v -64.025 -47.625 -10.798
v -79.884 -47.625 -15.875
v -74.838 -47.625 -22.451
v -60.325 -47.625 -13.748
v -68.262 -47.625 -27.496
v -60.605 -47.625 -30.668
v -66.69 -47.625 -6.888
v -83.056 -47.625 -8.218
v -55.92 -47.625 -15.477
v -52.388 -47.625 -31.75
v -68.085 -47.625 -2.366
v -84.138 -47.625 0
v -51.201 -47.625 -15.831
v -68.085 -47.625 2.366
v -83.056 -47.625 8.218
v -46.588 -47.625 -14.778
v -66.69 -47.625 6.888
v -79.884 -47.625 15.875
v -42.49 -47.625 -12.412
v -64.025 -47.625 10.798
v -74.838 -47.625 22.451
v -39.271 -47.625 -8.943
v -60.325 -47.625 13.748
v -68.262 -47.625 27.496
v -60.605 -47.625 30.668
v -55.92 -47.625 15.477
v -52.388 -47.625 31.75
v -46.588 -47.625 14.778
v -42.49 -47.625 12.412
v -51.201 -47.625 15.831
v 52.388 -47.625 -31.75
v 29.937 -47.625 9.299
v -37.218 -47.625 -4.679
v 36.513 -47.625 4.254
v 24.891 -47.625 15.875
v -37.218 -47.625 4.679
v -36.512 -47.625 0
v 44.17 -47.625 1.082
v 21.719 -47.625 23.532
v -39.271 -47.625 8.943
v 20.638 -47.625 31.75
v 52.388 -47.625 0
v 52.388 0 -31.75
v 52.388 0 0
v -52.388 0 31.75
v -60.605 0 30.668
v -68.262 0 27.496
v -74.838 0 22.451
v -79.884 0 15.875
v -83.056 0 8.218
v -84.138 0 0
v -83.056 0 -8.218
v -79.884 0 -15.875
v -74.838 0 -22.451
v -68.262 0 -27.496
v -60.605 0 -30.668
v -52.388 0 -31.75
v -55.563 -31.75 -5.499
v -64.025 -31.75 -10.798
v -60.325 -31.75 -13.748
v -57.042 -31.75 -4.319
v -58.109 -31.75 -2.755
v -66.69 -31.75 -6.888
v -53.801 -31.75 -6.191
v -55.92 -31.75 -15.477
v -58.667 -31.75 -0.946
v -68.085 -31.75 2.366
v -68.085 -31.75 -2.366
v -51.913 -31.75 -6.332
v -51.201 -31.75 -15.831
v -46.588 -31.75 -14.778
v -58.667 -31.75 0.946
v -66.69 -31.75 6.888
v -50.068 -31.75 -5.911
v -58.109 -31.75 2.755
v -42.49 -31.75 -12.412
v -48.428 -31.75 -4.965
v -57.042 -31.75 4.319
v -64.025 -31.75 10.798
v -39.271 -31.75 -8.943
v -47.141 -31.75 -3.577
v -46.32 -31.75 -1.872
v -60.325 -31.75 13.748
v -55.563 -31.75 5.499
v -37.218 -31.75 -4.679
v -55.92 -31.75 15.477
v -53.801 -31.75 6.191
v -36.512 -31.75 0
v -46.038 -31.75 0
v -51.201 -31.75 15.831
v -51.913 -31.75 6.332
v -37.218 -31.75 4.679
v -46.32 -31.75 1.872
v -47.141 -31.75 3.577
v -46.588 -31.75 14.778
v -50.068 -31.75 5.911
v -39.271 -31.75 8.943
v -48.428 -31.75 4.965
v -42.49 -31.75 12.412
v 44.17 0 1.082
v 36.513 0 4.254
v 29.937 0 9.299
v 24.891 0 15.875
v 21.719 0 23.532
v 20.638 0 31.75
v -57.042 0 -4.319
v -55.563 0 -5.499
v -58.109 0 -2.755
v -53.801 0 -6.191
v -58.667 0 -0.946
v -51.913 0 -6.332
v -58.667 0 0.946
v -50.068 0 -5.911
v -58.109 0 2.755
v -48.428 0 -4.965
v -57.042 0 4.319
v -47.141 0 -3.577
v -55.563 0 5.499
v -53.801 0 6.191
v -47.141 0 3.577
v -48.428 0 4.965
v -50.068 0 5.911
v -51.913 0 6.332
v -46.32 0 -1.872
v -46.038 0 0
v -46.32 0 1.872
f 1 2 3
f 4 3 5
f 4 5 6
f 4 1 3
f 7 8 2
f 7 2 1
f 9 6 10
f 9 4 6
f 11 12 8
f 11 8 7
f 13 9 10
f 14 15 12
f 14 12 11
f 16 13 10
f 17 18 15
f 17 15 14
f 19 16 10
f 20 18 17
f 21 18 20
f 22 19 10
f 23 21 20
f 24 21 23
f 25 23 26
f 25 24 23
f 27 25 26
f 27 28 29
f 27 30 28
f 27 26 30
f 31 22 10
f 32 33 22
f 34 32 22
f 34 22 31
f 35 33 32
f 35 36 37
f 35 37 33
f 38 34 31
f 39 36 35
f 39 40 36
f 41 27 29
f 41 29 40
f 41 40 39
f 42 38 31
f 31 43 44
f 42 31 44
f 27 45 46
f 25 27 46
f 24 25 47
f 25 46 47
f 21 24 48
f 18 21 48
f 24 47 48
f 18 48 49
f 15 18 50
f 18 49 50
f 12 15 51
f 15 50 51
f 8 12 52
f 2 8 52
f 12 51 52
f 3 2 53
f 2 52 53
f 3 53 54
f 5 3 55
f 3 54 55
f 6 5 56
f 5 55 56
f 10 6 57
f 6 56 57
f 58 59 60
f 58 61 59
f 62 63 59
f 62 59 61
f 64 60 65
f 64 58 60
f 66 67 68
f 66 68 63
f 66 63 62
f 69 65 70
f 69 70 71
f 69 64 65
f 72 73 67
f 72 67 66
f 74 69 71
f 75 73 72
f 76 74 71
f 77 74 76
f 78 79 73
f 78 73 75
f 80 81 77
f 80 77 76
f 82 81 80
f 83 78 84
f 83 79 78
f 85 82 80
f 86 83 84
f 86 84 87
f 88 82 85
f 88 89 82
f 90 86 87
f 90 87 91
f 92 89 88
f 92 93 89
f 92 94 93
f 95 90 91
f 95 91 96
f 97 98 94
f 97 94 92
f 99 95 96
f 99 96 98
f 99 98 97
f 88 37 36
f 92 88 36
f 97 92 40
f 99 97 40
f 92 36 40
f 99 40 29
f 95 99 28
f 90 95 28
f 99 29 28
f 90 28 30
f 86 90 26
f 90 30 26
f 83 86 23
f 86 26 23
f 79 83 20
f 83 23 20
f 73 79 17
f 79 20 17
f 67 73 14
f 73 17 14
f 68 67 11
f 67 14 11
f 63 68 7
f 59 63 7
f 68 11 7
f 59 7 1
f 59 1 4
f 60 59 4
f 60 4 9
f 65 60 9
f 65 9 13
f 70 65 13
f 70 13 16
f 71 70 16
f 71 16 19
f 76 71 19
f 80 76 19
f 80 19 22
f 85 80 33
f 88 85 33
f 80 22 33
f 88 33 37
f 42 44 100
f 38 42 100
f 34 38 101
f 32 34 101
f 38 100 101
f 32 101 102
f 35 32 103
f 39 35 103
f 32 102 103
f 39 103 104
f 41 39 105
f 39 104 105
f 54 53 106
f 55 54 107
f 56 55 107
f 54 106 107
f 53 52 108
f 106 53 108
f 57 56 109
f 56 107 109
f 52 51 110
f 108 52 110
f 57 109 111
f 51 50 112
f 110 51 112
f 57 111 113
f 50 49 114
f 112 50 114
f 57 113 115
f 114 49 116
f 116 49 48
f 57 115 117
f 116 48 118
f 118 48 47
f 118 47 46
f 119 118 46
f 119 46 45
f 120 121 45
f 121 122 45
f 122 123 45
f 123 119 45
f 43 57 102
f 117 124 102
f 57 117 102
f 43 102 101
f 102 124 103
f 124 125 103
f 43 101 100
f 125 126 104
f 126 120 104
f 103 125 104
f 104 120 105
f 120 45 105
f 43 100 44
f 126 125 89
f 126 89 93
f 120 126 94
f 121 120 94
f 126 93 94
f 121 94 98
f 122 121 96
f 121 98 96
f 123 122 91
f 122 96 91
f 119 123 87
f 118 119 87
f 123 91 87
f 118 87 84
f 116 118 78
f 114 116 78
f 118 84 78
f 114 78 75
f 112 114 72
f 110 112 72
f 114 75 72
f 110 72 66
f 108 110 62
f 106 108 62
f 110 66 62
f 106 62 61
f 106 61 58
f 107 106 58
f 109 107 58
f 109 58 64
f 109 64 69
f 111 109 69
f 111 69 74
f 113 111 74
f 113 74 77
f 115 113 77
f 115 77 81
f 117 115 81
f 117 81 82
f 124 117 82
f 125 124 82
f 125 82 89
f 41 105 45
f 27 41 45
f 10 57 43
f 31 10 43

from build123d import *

# Parameters (mm, degrees)
F1_DEPTH = 47.625
F2_R     = 15.875
F3_DEPTH = 15.875
F4_R     = 6.35
F5_DEPTH = 34.29


with BuildPart() as f1:
    # F0 (on Front) → F1 (new body)
    with BuildSketch(Plane.XZ):
        with BuildLine():
            ThreePointArc((-52.3875, 31.75), (-84.1375, 0), (-52.3875, -31.75))
            Line((-52.3875, -31.75), (52.3875, -31.75))
            Line((52.3875, -31.75), (52.3875, 0))
            ThreePointArc((52.3875, 0), (29.93686, 9.29936), (20.6375, 31.75))
            Line((20.6375, 31.75), (-52.3875, 31.75))
        make_face()
    extrude(amount=F1_DEPTH)

    # F2 (on face) → F3 (cut)
    with BuildSketch(Plane.XZ.offset(47.625)):
        with Locations((-52.3875, 0)):
            Circle(F2_R)
    extrude(amount=-F3_DEPTH, mode=Mode.SUBTRACT)

    # F4 (on face) → F5 (cut)
    with BuildSketch(Plane.XZ.offset(31.75)):
        with Locations((-52.3875, 0)):
            Circle(F4_R)
    extrude(amount=-F5_DEPTH, mode=Mode.SUBTRACT)


solid = f1.part
